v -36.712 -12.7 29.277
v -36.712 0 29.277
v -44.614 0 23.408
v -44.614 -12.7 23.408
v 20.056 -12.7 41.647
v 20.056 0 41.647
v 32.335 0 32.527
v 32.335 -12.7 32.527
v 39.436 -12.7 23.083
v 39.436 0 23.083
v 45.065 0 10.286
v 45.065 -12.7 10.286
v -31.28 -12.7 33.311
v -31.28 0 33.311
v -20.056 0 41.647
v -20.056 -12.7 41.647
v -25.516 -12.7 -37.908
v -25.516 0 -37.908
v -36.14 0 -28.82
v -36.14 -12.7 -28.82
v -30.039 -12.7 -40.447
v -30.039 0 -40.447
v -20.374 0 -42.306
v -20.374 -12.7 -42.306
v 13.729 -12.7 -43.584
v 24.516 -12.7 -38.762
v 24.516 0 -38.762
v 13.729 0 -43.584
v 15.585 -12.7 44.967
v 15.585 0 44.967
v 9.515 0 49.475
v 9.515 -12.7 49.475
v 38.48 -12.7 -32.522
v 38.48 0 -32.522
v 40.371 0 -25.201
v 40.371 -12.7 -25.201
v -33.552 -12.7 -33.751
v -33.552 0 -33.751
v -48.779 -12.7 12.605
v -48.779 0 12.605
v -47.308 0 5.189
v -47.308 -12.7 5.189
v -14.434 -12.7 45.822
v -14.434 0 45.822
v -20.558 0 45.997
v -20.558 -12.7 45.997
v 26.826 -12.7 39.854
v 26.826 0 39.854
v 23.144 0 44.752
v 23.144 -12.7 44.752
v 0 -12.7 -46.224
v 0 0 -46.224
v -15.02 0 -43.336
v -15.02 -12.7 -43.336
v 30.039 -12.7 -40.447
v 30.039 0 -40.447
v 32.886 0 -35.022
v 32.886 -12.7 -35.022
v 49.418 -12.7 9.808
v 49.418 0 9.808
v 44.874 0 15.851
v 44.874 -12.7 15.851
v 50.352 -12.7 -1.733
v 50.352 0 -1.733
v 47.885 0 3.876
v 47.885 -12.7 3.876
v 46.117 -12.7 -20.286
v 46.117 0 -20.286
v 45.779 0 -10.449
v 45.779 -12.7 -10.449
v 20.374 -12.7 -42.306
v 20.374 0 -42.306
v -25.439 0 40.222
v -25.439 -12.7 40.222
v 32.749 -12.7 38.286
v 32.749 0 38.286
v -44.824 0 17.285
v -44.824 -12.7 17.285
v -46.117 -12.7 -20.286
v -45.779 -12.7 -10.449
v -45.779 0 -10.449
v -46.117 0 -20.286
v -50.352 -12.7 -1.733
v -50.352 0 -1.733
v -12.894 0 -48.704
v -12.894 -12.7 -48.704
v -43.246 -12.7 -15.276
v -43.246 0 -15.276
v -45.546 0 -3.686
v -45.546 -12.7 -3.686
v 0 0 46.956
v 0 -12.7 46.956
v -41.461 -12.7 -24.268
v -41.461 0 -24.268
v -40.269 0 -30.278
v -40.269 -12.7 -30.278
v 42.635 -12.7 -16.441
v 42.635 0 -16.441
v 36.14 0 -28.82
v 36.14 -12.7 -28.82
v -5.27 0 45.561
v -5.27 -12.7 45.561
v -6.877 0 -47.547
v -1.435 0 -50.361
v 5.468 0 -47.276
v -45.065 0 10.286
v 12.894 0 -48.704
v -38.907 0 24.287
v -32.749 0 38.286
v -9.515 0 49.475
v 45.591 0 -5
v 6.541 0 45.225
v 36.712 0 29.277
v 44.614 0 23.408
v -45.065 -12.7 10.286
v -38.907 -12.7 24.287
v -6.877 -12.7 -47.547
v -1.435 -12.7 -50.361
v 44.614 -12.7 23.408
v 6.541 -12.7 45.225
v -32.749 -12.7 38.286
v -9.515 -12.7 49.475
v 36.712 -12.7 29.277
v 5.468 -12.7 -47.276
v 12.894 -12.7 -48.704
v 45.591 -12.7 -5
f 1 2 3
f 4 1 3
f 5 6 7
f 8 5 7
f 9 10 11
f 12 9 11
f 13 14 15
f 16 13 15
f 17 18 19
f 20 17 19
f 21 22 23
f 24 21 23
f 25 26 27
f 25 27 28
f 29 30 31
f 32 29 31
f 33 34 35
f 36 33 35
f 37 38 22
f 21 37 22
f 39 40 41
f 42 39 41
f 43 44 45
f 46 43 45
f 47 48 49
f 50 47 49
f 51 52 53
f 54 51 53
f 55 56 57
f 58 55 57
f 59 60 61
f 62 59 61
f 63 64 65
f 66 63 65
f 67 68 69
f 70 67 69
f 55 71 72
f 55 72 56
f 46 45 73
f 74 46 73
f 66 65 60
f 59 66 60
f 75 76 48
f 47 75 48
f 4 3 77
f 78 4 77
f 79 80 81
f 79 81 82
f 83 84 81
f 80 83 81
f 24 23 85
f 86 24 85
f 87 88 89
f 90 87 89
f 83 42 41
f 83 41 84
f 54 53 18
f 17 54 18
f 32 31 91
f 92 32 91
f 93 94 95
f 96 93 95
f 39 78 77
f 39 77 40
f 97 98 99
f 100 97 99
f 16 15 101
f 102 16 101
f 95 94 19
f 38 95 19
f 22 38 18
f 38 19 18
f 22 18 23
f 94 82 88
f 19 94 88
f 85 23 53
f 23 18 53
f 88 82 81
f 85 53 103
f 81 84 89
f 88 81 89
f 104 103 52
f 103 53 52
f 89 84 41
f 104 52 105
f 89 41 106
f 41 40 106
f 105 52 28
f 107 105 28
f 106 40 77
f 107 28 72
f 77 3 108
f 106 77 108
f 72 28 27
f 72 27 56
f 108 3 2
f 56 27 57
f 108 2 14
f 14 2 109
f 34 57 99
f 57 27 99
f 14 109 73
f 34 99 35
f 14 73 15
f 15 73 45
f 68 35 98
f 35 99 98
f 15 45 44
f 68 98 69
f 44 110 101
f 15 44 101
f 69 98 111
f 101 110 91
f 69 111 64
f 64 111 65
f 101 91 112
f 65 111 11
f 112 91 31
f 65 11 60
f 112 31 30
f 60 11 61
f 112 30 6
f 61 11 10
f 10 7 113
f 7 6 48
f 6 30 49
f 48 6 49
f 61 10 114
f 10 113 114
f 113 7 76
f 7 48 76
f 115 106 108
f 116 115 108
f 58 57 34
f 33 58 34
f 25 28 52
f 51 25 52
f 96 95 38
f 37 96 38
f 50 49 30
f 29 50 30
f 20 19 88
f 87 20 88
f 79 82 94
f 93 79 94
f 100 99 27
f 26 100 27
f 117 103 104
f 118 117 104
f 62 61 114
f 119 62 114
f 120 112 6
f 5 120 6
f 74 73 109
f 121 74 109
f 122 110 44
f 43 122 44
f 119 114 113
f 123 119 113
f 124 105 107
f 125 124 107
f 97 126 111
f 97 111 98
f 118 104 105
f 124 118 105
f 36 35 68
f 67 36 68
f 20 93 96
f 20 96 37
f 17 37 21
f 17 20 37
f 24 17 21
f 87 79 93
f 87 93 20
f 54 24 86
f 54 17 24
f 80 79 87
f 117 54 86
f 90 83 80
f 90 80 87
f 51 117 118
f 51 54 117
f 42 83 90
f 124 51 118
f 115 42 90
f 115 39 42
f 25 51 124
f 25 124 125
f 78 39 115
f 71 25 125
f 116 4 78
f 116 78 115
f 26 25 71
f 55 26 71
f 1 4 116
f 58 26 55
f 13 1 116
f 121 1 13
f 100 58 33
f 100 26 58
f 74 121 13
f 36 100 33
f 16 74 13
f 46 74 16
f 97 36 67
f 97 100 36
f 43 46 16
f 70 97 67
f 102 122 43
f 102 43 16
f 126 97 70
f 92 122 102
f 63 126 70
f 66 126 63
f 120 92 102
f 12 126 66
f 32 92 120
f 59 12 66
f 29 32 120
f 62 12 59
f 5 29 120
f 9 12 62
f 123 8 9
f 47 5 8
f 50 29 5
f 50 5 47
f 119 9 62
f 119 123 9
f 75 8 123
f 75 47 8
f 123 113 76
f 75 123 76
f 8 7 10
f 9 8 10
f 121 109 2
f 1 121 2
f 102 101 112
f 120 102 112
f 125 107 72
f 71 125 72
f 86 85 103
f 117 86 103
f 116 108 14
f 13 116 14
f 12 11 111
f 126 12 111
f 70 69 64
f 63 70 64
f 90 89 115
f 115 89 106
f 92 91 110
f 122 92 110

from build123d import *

# Parameters (mm, degrees)
F1_DEPTH = 12.7


with BuildPart() as f1:
    # F0 (on Front) → F1 (new body)
    with BuildSketch(Plane.XZ):
        Polygon((36.7118305086, 29.2767078878), (32.7487252653, 38.2864065468), (26.8258066759, 39.8544200468), (32.3351986213, 32.527134341), align=None)
        Polygon((44.6137633316, 23.4081194068), (36.7118305086, 29.2767078878), (39.4362804042, 23.0829605448), (44.8738240342, 15.8512304175), align=None)
        Polygon((39.4362804042, 23.0829605448), (36.7118305086, 29.2767078878), (32.3351986213, 32.527134341), align=None)
        Polygon((32.3351986213, 32.527134341), (26.8258066759, 39.8544200468), (20.0559669896, 41.6466445828), align=None)
        Polygon((20.0559669896, 41.6466445828), (26.8258066759, 39.8544200468), (23.143676418, 44.7515158919), (15.5853806795, 44.9668488809), align=None)
        Polygon((44.8738240342, 15.8512304175), (39.4362804042, 23.0829605448), (45.0653487584, 10.2858717752), align=None)
        Polygon((6.5411333928, 45.2245160678), (20.0559669896, 41.6466445828), (15.5853806795, 44.9668488809), align=None)
        Polygon((44.8738240342, 15.8512304175), (45.0653487584, 10.2858717752), (47.8850571971, 3.8755642564), (49.4179902366, 9.8076589327), align=None)
        Polygon((47.8850571971, 3.8755642564), (45.0653487584, 10.2858717752), (45.5914042437, -5.0003397286), align=None)
        Polygon((-5.2700710808, 45.5610128193), (6.5411333928, 45.2245160678), (0, 46.9561936707), align=None)
        Polygon((0, 46.9561936707), (6.5411333928, 45.2245160678), (15.5853806795, 44.9668488809), (9.5150217621, 49.4751684548), align=None)
        Polygon((50.3520142156, -1.7328003913), (47.8850571971, 3.8755642564), (45.5914042437, -5.0003397286), (45.7789038594, -10.4487360706), align=None)
        Polygon((45.7789038594, -10.4487360706), (45.5914042437, -5.0003397286), (42.6351039178, -16.440535075), align=None)
        Polygon((-5.2700710808, 45.5610128193), (0, 46.9561936707), (-9.5150217621, 49.4751684548), (-14.433823419, 45.82208466), align=None)
        Polygon((-20.0559669896, 41.6466445828), (-5.2700710808, 45.5610128193), (-14.433823419, 45.82208466), align=None)
        Polygon((46.1174311574, -20.2857209931), (45.7789038594, -10.4487360706), (42.6351039178, -16.440535075), (40.371362632, -25.2006878565), align=None)
        Polygon((40.371362632, -25.2006878565), (42.6351039178, -16.440535075), (36.1396037465, -28.8203722726), align=None)
        Polygon((-25.4391722107, 40.2215129805), (-20.0559669896, 41.6466445828), (-14.433823419, 45.82208466), (-20.5582977883, 45.99656862), align=None)
        Polygon((-31.2796204782, 33.3110885798), (-20.0559669896, 41.6466445828), (-25.4391722107, 40.2215129805), align=None)
        Polygon((40.371362632, -25.2006878565), (36.1396037465, -28.8203722726), (32.8858829718, -35.0216704662), (38.4795494638, -32.5215652427), align=None)
        Polygon((32.8858829718, -35.0216704662), (36.1396037465, -28.8203722726), (24.5163525755, -38.7624559943), align=None)
        Polygon((-38.9068697692, 24.2865193693), (-31.2796204782, 33.3110885798), (-36.7118305086, 29.2767078878), align=None)
        Polygon((-36.7118305086, 29.2767078878), (-31.2796204782, 33.3110885798), (-25.4391722107, 40.2215129805), (-32.7487252653, 38.2864065468), align=None)
        Polygon((30.0392094677, -40.4471732921), (32.8858829718, -35.0216704662), (24.5163525755, -38.7624559943), (20.3735288846, -42.3060686525), align=None)
        Polygon((20.3735288846, -42.3060686525), (24.5163525755, -38.7624559943), (13.7288245836, -43.5839724576), align=None)
        Polygon((-38.9068697692, 24.2865193693), (-36.7118305086, 29.2767078878), (-44.6137633316, 23.4081194068), (-44.8244900831, 17.284784924), align=None)
        Polygon((-45.0653487584, 10.2858717752), (-38.9068697692, 24.2865193693), (-44.8244900831, 17.284784924), align=None)
        Polygon((12.8937326976, -48.703999732), (20.3735288846, -42.3060686525), (13.7288245836, -43.5839724576), (5.4684417421, -47.2759741742), align=None)
        Polygon((5.4684417421, -47.2759741742), (13.7288245836, -43.5839724576), (0, -46.2242881707), align=None)
        Polygon((-47.3075095617, 5.1885574364), (-45.0653487584, 10.2858717752), (-44.8244900831, 17.284784924), (-48.7794544472, 12.6052670182), align=None)
        Polygon((-45.5461821411, -3.6862680312), (-45.0653487584, 10.2858717752), (-47.3075095617, 5.1885574364), align=None)
        Polygon((5.4684417421, -47.2759741742), (0, -46.2242881707), (-6.8770318811, -47.5468730158), (-1.4347768951, -50.3613874713), align=None)
        Polygon((-6.8770318811, -47.5468730158), (0, -46.2242881707), (-15.0200126245, -43.3356522862), align=None)
        Polygon((-43.2460019659, -15.2762185204), (-45.5461821411, -3.6862680312), (-45.7789038594, -10.4487360706), align=None)
        Polygon((-45.7789038594, -10.4487360706), (-45.5461821411, -3.6862680312), (-47.3075095617, 5.1885574364), (-50.3520142156, -1.7328003913), align=None)
        Polygon((-12.8937326976, -48.703999732), (-6.8770318811, -47.5468730158), (-15.0200126245, -43.3356522862), (-20.3735288846, -42.3060686525), align=None)
        Polygon((-20.3735288846, -42.3060686525), (-15.0200126245, -43.3356522862), (-25.515539679, -37.9077896286), align=None)
        Polygon((-43.2460019659, -15.2762185204), (-45.7789038594, -10.4487360706), (-46.1174311574, -20.2857209931), (-41.4614014616, -24.2683104051), align=None)
        Polygon((-36.1396037465, -28.8203722726), (-43.2460019659, -15.2762185204), (-41.4614014616, -24.2683104051), align=None)
        Polygon((-30.0392094677, -40.4471732921), (-20.3735288846, -42.3060686525), (-25.515539679, -37.9077896286), (-33.5523273154, -33.7514876846), align=None)
        Polygon((-33.5523273154, -33.7514876846), (-25.515539679, -37.9077896286), (-36.1396037465, -28.8203722726), align=None)
        Polygon((-33.5523273154, -33.7514876846), (-36.1396037465, -28.8203722726), (-41.4614014616, -24.2683104051), (-40.2686869878, -30.2780577489), align=None)
    extrude(amount=F1_DEPTH)


solid = f1.part
